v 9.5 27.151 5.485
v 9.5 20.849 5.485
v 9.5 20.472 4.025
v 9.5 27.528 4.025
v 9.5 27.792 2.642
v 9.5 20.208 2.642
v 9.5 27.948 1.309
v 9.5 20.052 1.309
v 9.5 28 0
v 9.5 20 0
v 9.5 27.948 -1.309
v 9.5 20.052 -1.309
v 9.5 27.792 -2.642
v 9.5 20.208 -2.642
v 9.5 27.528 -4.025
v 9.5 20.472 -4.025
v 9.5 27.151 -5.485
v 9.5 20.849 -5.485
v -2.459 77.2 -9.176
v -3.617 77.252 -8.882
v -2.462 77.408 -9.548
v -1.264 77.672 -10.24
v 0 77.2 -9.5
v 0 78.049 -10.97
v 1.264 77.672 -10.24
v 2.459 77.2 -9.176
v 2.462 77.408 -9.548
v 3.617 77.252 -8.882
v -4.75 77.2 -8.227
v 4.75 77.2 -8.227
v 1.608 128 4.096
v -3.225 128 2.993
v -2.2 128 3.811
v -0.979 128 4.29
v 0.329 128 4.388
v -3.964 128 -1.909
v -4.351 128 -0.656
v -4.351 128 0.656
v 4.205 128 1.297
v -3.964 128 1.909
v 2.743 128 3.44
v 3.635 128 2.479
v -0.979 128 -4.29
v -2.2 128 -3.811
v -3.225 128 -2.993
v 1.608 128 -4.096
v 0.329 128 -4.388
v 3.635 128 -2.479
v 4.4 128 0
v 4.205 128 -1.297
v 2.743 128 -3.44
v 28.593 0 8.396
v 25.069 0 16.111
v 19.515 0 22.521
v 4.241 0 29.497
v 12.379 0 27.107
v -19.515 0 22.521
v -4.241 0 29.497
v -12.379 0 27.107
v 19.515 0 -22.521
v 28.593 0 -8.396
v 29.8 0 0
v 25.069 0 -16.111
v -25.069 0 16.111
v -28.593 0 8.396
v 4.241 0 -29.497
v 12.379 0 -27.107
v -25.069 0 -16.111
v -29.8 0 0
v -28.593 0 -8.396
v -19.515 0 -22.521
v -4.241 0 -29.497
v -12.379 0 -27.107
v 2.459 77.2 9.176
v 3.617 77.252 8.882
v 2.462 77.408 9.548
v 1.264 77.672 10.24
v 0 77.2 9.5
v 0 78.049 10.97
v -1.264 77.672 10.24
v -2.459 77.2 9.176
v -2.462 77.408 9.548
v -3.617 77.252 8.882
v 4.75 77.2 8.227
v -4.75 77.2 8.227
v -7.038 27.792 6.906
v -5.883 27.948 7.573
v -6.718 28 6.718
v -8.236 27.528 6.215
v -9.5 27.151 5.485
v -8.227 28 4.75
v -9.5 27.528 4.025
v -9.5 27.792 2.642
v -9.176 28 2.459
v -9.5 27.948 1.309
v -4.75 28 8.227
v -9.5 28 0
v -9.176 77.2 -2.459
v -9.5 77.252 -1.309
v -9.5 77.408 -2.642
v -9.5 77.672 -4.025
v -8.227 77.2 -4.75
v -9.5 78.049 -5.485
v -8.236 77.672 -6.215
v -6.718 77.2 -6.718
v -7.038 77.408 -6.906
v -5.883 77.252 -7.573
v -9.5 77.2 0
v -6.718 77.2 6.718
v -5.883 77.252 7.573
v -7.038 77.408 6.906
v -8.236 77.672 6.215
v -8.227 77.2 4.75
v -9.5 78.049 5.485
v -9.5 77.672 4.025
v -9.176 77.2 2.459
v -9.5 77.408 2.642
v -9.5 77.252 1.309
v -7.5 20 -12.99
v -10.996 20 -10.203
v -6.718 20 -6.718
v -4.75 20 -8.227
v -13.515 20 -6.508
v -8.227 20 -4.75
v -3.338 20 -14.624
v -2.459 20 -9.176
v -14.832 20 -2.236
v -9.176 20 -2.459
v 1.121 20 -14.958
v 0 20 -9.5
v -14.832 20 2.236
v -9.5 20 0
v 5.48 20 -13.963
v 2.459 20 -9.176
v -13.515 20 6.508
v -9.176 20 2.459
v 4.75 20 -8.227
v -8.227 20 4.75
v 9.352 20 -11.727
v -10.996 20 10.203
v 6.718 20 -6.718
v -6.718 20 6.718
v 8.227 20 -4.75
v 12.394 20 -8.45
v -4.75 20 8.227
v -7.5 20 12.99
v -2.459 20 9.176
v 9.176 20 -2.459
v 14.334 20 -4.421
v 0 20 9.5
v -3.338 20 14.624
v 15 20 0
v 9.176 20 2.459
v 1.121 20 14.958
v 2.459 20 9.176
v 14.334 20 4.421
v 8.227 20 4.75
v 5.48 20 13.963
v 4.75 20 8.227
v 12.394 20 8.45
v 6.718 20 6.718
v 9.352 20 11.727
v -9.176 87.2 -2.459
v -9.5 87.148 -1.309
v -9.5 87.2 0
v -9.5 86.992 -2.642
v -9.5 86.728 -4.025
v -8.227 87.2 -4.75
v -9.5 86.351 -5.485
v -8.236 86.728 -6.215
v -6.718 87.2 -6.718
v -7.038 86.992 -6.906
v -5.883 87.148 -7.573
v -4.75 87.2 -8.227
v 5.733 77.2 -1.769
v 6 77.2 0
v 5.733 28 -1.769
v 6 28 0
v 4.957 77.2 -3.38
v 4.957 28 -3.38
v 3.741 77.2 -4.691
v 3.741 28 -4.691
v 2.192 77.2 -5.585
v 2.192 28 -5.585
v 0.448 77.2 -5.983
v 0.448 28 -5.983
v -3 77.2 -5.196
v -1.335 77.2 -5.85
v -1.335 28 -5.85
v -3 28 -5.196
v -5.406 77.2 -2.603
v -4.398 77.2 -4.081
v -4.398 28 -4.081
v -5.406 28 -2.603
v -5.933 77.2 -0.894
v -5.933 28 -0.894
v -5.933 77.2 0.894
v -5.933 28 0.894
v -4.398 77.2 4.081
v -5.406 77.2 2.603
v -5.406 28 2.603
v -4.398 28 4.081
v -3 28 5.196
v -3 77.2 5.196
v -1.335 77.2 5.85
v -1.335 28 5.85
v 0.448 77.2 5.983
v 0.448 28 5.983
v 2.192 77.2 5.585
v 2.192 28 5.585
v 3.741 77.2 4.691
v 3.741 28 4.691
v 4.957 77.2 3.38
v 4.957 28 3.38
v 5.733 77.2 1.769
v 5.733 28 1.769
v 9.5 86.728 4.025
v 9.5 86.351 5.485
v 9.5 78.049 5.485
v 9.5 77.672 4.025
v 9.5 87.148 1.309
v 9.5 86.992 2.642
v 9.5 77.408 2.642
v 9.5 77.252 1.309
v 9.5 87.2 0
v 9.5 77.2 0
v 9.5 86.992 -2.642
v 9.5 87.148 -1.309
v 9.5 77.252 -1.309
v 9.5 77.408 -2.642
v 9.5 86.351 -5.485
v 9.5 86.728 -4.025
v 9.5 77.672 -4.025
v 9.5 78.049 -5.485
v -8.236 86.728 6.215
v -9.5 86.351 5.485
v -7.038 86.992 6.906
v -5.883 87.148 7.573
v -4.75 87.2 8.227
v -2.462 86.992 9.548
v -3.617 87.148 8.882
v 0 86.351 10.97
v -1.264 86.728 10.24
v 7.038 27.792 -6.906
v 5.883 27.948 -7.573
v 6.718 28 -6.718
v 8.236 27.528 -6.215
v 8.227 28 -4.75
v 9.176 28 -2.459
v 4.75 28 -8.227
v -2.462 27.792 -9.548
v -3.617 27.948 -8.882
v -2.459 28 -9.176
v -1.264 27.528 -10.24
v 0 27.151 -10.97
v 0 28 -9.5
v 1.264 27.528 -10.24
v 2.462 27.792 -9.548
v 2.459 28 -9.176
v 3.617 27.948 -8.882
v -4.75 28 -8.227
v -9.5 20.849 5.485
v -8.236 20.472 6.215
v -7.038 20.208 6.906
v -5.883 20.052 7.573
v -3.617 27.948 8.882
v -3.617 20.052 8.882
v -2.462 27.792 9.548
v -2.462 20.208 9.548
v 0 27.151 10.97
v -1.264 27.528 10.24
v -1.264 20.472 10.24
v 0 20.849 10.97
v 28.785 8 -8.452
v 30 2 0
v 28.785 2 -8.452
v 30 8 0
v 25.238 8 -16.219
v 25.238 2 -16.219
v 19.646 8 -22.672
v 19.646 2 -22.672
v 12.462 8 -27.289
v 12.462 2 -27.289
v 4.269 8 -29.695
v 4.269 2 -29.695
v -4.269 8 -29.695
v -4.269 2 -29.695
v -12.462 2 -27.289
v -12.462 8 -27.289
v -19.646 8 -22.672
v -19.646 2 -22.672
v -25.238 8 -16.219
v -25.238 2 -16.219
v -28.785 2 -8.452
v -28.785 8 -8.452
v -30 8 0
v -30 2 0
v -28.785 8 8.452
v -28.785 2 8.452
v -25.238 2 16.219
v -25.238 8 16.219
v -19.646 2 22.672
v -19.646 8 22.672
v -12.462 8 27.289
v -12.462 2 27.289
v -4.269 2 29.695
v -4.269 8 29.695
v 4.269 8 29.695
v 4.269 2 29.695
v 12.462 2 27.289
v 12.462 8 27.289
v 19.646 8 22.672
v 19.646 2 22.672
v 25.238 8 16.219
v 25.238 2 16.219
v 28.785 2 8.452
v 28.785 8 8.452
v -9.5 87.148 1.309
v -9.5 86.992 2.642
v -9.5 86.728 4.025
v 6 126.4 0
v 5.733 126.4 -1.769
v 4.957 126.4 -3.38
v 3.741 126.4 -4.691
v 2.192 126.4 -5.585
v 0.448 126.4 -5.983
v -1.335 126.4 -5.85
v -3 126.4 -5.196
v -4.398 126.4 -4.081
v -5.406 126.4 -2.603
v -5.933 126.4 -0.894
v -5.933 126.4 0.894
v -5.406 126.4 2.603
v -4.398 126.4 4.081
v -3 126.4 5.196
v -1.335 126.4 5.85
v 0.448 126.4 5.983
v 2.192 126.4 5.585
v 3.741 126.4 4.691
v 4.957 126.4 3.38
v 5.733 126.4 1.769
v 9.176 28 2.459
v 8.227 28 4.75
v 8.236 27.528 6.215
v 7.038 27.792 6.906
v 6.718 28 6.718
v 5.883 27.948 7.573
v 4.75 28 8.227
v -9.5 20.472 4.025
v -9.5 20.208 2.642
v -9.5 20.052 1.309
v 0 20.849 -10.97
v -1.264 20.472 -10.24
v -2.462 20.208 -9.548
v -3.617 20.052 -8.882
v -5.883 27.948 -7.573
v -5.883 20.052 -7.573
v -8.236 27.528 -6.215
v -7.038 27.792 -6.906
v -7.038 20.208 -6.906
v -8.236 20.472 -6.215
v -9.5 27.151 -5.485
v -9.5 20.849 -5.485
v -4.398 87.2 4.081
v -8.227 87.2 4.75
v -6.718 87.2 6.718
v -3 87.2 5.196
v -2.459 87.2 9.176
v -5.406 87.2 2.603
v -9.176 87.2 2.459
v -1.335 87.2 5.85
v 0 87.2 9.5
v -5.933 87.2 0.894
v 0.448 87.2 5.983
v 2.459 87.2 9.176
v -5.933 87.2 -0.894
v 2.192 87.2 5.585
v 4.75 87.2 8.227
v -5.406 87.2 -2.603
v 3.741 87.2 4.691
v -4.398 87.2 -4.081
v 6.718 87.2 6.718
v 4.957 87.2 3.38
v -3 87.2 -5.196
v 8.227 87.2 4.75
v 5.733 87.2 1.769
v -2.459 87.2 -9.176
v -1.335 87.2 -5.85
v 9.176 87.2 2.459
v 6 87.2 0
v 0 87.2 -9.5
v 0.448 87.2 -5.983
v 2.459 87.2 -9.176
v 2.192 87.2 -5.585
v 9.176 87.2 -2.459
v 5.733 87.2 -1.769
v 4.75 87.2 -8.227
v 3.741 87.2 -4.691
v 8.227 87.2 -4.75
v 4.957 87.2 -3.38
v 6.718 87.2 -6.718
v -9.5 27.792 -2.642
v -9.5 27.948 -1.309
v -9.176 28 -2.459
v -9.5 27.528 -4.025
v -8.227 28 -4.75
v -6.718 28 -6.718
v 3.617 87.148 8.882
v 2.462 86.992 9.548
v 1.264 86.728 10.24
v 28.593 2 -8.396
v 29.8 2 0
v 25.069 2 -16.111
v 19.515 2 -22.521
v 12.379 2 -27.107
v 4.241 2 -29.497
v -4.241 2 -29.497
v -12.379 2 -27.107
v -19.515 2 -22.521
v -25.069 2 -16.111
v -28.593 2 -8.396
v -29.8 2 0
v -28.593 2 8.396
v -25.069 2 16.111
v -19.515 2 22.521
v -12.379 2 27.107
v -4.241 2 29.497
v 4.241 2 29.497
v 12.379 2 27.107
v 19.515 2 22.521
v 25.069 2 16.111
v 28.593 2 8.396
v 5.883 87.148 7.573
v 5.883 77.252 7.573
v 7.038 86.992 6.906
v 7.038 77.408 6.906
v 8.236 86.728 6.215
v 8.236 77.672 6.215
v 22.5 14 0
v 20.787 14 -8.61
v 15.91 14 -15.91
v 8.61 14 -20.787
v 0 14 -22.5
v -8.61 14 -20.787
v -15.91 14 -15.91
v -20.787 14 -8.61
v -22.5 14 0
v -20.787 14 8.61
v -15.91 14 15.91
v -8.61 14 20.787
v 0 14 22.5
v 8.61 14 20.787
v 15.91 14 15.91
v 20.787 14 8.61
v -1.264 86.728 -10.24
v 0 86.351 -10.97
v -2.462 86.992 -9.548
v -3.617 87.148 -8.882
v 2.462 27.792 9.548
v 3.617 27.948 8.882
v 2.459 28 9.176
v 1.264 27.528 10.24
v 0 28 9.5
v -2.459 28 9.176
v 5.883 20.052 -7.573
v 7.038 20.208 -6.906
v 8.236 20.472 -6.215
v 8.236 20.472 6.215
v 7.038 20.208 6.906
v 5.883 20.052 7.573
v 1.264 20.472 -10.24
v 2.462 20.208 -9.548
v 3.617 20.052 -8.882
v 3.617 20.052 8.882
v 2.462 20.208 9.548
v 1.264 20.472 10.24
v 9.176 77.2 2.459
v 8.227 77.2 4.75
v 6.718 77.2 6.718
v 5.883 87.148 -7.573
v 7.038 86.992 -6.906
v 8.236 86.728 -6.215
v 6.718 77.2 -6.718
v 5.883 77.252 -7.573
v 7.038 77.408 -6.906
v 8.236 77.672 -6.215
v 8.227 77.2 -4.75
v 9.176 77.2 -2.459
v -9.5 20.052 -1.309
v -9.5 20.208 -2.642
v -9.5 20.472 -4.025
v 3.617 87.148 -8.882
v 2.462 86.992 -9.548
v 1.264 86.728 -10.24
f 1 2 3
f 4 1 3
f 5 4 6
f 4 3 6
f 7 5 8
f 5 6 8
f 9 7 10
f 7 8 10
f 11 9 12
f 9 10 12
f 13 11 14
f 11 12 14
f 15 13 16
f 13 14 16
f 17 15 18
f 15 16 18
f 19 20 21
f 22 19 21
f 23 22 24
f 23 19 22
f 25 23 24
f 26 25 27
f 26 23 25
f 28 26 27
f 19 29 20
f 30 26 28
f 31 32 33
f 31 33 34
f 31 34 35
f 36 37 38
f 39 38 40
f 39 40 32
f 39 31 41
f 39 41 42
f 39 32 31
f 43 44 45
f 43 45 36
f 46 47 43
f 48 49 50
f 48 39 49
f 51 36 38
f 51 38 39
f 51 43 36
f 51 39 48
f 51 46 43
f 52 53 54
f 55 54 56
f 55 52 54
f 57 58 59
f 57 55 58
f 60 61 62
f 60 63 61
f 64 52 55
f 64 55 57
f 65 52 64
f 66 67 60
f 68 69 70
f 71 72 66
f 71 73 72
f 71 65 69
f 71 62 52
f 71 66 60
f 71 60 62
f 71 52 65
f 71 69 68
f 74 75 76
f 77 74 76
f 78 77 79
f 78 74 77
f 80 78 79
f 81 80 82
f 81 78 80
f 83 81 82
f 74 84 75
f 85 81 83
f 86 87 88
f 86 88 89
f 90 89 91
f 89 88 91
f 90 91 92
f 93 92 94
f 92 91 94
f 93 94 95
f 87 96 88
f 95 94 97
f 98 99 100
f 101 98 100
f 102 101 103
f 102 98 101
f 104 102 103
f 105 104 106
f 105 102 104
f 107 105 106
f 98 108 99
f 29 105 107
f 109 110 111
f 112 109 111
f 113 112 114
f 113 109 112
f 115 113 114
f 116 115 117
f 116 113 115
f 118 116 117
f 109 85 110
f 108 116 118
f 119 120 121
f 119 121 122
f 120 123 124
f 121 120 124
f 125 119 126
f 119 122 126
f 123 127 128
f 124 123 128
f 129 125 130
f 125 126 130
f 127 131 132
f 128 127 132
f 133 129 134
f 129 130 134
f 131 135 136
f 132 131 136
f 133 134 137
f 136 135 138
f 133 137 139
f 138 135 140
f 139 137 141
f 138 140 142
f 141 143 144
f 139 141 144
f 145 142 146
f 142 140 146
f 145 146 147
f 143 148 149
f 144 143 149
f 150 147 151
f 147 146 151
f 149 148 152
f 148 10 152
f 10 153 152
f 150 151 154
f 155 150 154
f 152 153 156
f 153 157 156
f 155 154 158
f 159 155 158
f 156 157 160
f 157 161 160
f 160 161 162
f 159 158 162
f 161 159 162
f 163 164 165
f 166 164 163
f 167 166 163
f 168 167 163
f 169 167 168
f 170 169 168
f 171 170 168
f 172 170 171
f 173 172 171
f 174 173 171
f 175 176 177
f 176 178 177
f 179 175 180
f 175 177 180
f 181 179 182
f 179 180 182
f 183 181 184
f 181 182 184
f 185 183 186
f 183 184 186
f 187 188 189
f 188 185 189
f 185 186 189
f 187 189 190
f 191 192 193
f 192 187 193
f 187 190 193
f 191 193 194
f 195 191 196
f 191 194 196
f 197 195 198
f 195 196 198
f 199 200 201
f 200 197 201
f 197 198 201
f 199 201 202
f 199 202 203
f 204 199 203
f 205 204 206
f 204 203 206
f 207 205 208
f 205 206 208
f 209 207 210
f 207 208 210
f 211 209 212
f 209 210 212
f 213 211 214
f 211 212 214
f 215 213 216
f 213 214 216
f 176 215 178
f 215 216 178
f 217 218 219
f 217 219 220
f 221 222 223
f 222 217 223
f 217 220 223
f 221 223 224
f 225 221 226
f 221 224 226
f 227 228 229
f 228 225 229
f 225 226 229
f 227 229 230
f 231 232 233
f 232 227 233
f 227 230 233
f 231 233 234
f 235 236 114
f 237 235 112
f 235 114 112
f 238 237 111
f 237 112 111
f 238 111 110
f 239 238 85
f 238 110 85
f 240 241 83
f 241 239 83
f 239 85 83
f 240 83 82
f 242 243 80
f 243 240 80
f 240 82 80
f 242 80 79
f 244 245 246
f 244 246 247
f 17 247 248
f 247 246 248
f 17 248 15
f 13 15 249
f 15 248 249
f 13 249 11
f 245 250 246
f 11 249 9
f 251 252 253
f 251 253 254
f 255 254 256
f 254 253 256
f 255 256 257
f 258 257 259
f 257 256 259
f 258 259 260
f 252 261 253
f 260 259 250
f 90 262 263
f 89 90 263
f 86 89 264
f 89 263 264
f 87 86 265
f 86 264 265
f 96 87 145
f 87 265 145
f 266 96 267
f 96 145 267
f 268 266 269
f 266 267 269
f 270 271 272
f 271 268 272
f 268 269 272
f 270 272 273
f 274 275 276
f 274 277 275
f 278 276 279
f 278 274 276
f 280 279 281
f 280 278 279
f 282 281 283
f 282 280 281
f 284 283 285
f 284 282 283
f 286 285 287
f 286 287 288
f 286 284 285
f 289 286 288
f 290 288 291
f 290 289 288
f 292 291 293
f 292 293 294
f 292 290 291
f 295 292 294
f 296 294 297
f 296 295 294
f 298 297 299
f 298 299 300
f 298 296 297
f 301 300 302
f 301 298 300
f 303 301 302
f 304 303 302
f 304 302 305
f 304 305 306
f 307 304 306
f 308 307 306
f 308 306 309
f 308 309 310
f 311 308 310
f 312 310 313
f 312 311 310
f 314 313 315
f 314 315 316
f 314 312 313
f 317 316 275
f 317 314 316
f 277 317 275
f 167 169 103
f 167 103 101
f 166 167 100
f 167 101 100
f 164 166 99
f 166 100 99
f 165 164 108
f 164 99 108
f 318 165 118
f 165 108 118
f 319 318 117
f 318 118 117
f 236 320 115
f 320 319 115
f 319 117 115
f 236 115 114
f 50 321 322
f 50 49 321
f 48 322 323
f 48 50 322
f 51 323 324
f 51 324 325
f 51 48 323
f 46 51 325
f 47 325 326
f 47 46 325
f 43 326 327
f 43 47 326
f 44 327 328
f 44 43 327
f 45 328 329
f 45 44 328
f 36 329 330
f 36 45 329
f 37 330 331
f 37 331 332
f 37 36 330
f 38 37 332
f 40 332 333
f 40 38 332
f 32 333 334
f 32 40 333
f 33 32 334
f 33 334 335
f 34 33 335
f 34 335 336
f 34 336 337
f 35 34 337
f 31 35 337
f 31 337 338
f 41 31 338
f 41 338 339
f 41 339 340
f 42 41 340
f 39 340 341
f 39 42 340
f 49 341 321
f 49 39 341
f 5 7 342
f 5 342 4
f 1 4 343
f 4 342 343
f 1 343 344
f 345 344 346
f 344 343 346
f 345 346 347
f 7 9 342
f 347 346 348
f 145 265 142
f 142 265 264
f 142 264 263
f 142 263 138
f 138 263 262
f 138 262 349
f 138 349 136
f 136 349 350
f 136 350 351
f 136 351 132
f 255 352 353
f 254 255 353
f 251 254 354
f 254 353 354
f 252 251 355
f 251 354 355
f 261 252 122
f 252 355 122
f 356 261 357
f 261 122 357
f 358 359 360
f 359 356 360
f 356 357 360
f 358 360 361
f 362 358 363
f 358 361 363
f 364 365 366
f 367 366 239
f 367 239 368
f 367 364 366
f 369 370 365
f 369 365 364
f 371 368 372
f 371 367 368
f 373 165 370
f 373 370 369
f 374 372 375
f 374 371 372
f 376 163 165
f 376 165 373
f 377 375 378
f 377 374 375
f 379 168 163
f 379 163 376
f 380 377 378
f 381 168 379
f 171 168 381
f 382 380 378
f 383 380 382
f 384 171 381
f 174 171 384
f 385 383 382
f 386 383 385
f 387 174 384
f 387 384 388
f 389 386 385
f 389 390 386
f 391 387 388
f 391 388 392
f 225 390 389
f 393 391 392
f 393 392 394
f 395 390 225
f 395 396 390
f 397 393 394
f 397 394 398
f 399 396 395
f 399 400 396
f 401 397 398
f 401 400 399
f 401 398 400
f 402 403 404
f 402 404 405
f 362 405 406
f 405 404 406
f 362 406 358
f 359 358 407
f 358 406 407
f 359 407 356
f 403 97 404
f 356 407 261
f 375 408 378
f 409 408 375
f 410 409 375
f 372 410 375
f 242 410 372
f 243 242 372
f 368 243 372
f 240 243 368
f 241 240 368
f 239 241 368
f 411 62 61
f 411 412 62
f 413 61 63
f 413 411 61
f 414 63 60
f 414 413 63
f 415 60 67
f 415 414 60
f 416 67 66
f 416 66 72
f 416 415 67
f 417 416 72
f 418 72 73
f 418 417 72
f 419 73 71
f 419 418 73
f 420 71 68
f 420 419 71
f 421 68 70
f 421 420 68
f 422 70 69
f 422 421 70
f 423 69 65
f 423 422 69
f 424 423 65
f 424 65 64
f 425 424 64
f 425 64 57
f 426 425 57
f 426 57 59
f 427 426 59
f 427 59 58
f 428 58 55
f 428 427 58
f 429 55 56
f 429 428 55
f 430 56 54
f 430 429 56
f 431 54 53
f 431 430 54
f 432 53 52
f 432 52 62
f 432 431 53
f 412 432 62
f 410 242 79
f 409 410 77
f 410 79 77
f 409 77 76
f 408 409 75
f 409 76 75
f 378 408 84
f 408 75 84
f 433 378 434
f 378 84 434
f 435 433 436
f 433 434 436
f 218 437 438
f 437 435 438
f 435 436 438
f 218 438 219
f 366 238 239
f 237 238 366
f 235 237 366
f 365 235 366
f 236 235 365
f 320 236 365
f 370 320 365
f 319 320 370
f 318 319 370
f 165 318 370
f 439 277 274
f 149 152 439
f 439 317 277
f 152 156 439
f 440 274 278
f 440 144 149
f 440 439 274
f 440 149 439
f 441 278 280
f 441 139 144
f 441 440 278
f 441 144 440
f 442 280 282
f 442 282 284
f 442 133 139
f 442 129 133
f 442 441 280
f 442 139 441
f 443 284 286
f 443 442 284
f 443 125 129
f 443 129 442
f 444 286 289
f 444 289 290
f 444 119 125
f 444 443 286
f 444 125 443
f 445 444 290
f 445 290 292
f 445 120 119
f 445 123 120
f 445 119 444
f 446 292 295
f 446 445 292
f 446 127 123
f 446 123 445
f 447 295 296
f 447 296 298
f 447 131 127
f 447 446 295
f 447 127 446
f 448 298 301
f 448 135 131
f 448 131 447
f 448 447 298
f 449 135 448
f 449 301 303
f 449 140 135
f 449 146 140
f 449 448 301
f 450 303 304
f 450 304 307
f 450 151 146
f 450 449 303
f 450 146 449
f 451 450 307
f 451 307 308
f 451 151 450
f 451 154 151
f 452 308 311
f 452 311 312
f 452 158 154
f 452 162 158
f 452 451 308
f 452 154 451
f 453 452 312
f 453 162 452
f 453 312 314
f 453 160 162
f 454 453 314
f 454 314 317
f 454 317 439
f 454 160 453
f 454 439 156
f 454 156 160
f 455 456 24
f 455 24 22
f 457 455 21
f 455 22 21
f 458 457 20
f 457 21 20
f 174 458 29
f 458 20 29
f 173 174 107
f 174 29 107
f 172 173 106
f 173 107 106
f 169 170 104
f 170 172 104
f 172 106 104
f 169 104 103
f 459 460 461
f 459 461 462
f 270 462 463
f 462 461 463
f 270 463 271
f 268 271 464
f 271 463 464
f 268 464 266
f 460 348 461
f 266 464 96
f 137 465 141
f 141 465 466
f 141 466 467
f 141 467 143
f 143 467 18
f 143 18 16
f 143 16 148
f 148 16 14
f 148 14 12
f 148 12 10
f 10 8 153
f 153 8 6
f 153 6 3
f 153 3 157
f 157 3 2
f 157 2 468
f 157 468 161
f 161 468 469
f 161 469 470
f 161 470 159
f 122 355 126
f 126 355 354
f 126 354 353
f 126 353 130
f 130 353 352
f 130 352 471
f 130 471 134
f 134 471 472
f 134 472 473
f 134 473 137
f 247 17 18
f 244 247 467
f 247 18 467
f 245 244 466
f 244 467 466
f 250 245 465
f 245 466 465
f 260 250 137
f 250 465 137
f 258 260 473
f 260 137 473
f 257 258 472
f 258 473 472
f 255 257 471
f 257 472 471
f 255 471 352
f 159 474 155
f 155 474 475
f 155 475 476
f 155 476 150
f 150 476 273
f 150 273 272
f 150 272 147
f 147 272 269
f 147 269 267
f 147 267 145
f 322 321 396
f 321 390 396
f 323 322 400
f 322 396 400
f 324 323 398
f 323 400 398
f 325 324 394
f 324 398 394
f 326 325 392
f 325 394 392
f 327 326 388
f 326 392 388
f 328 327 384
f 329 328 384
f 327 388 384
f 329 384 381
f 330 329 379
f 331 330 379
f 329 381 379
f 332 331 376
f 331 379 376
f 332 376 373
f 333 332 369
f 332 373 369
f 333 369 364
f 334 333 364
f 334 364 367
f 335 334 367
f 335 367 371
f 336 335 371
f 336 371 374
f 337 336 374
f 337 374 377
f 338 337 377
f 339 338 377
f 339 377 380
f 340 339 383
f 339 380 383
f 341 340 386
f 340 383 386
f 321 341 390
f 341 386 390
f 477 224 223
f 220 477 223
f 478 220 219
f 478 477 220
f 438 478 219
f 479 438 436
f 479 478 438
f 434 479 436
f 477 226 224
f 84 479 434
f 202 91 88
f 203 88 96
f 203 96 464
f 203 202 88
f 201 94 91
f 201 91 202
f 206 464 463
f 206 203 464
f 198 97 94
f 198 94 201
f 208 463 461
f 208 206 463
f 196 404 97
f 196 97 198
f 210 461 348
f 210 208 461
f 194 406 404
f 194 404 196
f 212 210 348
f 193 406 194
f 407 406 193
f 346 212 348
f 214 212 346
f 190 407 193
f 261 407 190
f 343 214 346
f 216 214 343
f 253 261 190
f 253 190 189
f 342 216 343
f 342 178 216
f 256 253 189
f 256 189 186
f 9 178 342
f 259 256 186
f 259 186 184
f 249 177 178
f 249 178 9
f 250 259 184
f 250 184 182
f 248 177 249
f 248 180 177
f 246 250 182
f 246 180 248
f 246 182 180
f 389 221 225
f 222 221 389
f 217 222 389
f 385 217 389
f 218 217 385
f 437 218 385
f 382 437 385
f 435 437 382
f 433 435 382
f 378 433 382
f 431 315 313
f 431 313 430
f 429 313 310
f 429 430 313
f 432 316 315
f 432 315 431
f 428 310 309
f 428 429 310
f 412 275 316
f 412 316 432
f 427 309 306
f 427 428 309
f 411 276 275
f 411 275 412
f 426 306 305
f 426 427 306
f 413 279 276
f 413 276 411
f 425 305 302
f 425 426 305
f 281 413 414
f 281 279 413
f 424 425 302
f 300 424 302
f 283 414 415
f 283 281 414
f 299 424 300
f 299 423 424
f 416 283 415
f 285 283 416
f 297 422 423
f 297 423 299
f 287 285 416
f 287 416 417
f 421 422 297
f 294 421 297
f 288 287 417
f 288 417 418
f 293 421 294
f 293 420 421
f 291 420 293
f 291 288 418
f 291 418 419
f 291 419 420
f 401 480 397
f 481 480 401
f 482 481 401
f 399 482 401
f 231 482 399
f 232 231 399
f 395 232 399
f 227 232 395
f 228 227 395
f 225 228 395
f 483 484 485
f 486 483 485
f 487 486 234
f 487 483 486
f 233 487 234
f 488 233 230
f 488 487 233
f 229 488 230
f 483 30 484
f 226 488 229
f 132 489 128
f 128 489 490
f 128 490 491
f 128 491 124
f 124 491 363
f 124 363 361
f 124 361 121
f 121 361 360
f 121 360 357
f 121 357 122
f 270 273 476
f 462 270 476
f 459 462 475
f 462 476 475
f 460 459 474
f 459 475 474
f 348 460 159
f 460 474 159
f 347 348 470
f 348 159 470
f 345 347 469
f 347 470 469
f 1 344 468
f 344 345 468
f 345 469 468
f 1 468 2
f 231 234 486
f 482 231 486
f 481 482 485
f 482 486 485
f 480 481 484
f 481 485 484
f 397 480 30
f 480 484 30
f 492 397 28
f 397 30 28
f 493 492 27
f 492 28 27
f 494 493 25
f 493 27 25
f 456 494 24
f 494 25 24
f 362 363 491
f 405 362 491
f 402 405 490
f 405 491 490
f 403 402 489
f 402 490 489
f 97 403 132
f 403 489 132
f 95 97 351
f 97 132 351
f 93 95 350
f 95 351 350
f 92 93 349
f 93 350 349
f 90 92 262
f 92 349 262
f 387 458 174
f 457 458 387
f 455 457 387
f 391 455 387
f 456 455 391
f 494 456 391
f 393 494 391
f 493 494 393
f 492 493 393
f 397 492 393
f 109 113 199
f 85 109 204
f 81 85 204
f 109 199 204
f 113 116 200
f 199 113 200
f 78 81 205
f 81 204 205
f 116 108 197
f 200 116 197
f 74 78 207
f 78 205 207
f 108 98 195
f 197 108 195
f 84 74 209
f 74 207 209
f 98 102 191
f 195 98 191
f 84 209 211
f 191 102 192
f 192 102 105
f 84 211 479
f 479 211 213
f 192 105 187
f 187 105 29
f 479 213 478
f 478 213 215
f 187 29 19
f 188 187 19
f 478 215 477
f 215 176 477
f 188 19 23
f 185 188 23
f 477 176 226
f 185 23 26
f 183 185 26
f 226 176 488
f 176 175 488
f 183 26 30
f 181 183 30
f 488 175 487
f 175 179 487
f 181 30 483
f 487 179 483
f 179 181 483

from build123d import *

# Parameters (mm, degrees)
EXTRUDE_1_DEPTH = 8
EXTRUDE_2_DEPTH = 10


with BuildPart() as part:
    # Эскиз1 → Повернуть1 (revolve)
    with BuildSketch(Plane.XY, mode=Mode.PRIVATE) as revolve_1_sk:
        Polygon((0, 0), (-29.8, 0), (-29.8, 2), (-30, 2), (-30, 8), (-15, 20), (-6, 20), (-6, 28), (-6, 126.4), (-4.4, 128), (0, 128), align=None)
    revolve(revolve_1_sk.sketch.rotate(Axis((0, 0, 0), (0, 1, 0)), 180), axis=Axis((0, 0, 0), (0, 1, 0)))  # turned: the seam where the file's is

    # Эскиз2 → Бобышка-Вытянуть1 (add)
    with BuildSketch(Plane(origin=(0, 20, 0), x_dir=(1, 0, 0), z_dir=(0, 1, 0))):
        Polygon((0, 10.969655115), (-9.5, 5.484827557), (-9.5, -5.484827557), (0, -10.969655115), (9.5, -5.484827557), (9.5, 5.484827557), align=None)
    extrude(amount=EXTRUDE_1_DEPTH)

    # Эскиз3 → Бобышка-Вытянуть2 (add)
    with BuildSketch(Plane(origin=(0, 77.2, 0), x_dir=(1, 0, 0), z_dir=(0, 1, 0))):
        Polygon((9.5, 5.484827557), (0, 10.969655115), (-9.5, 5.484827557), (-9.5, -5.484827557), (0, -10.969655115), (9.5, -5.484827557), align=None)
    extrude(amount=EXTRUDE_2_DEPTH)

    # Эскиз4 → Вырез-Повернуть2 (revolve, cut)
    with BuildSketch(Plane.XY, mode=Mode.PRIVATE) as cut_revolve_2_sk:
        Polygon((-18.160254038, 87.2), (-9.5, 87.2), (-18.160254038, 82.2), align=None)
        Polygon((-18.160254038, 77.2), (-18.160254038, 82.2), (-9.5, 77.2), align=None)
        Polygon((-16.42820323, 28), (-16.42820323, 24), (-9.5, 28), align=None)
        Polygon((-16.42820323, 24), (-16.42820323, 20), (-9.5, 20), align=None)
    revolve(cut_revolve_2_sk.sketch.rotate(Axis((0, 128, 0), (0, -1, 0)), 180), axis=Axis((0, 128, 0), (0, -1, 0)), mode=Mode.SUBTRACT)  # turned: the seam where the file's is


solid = part.part
